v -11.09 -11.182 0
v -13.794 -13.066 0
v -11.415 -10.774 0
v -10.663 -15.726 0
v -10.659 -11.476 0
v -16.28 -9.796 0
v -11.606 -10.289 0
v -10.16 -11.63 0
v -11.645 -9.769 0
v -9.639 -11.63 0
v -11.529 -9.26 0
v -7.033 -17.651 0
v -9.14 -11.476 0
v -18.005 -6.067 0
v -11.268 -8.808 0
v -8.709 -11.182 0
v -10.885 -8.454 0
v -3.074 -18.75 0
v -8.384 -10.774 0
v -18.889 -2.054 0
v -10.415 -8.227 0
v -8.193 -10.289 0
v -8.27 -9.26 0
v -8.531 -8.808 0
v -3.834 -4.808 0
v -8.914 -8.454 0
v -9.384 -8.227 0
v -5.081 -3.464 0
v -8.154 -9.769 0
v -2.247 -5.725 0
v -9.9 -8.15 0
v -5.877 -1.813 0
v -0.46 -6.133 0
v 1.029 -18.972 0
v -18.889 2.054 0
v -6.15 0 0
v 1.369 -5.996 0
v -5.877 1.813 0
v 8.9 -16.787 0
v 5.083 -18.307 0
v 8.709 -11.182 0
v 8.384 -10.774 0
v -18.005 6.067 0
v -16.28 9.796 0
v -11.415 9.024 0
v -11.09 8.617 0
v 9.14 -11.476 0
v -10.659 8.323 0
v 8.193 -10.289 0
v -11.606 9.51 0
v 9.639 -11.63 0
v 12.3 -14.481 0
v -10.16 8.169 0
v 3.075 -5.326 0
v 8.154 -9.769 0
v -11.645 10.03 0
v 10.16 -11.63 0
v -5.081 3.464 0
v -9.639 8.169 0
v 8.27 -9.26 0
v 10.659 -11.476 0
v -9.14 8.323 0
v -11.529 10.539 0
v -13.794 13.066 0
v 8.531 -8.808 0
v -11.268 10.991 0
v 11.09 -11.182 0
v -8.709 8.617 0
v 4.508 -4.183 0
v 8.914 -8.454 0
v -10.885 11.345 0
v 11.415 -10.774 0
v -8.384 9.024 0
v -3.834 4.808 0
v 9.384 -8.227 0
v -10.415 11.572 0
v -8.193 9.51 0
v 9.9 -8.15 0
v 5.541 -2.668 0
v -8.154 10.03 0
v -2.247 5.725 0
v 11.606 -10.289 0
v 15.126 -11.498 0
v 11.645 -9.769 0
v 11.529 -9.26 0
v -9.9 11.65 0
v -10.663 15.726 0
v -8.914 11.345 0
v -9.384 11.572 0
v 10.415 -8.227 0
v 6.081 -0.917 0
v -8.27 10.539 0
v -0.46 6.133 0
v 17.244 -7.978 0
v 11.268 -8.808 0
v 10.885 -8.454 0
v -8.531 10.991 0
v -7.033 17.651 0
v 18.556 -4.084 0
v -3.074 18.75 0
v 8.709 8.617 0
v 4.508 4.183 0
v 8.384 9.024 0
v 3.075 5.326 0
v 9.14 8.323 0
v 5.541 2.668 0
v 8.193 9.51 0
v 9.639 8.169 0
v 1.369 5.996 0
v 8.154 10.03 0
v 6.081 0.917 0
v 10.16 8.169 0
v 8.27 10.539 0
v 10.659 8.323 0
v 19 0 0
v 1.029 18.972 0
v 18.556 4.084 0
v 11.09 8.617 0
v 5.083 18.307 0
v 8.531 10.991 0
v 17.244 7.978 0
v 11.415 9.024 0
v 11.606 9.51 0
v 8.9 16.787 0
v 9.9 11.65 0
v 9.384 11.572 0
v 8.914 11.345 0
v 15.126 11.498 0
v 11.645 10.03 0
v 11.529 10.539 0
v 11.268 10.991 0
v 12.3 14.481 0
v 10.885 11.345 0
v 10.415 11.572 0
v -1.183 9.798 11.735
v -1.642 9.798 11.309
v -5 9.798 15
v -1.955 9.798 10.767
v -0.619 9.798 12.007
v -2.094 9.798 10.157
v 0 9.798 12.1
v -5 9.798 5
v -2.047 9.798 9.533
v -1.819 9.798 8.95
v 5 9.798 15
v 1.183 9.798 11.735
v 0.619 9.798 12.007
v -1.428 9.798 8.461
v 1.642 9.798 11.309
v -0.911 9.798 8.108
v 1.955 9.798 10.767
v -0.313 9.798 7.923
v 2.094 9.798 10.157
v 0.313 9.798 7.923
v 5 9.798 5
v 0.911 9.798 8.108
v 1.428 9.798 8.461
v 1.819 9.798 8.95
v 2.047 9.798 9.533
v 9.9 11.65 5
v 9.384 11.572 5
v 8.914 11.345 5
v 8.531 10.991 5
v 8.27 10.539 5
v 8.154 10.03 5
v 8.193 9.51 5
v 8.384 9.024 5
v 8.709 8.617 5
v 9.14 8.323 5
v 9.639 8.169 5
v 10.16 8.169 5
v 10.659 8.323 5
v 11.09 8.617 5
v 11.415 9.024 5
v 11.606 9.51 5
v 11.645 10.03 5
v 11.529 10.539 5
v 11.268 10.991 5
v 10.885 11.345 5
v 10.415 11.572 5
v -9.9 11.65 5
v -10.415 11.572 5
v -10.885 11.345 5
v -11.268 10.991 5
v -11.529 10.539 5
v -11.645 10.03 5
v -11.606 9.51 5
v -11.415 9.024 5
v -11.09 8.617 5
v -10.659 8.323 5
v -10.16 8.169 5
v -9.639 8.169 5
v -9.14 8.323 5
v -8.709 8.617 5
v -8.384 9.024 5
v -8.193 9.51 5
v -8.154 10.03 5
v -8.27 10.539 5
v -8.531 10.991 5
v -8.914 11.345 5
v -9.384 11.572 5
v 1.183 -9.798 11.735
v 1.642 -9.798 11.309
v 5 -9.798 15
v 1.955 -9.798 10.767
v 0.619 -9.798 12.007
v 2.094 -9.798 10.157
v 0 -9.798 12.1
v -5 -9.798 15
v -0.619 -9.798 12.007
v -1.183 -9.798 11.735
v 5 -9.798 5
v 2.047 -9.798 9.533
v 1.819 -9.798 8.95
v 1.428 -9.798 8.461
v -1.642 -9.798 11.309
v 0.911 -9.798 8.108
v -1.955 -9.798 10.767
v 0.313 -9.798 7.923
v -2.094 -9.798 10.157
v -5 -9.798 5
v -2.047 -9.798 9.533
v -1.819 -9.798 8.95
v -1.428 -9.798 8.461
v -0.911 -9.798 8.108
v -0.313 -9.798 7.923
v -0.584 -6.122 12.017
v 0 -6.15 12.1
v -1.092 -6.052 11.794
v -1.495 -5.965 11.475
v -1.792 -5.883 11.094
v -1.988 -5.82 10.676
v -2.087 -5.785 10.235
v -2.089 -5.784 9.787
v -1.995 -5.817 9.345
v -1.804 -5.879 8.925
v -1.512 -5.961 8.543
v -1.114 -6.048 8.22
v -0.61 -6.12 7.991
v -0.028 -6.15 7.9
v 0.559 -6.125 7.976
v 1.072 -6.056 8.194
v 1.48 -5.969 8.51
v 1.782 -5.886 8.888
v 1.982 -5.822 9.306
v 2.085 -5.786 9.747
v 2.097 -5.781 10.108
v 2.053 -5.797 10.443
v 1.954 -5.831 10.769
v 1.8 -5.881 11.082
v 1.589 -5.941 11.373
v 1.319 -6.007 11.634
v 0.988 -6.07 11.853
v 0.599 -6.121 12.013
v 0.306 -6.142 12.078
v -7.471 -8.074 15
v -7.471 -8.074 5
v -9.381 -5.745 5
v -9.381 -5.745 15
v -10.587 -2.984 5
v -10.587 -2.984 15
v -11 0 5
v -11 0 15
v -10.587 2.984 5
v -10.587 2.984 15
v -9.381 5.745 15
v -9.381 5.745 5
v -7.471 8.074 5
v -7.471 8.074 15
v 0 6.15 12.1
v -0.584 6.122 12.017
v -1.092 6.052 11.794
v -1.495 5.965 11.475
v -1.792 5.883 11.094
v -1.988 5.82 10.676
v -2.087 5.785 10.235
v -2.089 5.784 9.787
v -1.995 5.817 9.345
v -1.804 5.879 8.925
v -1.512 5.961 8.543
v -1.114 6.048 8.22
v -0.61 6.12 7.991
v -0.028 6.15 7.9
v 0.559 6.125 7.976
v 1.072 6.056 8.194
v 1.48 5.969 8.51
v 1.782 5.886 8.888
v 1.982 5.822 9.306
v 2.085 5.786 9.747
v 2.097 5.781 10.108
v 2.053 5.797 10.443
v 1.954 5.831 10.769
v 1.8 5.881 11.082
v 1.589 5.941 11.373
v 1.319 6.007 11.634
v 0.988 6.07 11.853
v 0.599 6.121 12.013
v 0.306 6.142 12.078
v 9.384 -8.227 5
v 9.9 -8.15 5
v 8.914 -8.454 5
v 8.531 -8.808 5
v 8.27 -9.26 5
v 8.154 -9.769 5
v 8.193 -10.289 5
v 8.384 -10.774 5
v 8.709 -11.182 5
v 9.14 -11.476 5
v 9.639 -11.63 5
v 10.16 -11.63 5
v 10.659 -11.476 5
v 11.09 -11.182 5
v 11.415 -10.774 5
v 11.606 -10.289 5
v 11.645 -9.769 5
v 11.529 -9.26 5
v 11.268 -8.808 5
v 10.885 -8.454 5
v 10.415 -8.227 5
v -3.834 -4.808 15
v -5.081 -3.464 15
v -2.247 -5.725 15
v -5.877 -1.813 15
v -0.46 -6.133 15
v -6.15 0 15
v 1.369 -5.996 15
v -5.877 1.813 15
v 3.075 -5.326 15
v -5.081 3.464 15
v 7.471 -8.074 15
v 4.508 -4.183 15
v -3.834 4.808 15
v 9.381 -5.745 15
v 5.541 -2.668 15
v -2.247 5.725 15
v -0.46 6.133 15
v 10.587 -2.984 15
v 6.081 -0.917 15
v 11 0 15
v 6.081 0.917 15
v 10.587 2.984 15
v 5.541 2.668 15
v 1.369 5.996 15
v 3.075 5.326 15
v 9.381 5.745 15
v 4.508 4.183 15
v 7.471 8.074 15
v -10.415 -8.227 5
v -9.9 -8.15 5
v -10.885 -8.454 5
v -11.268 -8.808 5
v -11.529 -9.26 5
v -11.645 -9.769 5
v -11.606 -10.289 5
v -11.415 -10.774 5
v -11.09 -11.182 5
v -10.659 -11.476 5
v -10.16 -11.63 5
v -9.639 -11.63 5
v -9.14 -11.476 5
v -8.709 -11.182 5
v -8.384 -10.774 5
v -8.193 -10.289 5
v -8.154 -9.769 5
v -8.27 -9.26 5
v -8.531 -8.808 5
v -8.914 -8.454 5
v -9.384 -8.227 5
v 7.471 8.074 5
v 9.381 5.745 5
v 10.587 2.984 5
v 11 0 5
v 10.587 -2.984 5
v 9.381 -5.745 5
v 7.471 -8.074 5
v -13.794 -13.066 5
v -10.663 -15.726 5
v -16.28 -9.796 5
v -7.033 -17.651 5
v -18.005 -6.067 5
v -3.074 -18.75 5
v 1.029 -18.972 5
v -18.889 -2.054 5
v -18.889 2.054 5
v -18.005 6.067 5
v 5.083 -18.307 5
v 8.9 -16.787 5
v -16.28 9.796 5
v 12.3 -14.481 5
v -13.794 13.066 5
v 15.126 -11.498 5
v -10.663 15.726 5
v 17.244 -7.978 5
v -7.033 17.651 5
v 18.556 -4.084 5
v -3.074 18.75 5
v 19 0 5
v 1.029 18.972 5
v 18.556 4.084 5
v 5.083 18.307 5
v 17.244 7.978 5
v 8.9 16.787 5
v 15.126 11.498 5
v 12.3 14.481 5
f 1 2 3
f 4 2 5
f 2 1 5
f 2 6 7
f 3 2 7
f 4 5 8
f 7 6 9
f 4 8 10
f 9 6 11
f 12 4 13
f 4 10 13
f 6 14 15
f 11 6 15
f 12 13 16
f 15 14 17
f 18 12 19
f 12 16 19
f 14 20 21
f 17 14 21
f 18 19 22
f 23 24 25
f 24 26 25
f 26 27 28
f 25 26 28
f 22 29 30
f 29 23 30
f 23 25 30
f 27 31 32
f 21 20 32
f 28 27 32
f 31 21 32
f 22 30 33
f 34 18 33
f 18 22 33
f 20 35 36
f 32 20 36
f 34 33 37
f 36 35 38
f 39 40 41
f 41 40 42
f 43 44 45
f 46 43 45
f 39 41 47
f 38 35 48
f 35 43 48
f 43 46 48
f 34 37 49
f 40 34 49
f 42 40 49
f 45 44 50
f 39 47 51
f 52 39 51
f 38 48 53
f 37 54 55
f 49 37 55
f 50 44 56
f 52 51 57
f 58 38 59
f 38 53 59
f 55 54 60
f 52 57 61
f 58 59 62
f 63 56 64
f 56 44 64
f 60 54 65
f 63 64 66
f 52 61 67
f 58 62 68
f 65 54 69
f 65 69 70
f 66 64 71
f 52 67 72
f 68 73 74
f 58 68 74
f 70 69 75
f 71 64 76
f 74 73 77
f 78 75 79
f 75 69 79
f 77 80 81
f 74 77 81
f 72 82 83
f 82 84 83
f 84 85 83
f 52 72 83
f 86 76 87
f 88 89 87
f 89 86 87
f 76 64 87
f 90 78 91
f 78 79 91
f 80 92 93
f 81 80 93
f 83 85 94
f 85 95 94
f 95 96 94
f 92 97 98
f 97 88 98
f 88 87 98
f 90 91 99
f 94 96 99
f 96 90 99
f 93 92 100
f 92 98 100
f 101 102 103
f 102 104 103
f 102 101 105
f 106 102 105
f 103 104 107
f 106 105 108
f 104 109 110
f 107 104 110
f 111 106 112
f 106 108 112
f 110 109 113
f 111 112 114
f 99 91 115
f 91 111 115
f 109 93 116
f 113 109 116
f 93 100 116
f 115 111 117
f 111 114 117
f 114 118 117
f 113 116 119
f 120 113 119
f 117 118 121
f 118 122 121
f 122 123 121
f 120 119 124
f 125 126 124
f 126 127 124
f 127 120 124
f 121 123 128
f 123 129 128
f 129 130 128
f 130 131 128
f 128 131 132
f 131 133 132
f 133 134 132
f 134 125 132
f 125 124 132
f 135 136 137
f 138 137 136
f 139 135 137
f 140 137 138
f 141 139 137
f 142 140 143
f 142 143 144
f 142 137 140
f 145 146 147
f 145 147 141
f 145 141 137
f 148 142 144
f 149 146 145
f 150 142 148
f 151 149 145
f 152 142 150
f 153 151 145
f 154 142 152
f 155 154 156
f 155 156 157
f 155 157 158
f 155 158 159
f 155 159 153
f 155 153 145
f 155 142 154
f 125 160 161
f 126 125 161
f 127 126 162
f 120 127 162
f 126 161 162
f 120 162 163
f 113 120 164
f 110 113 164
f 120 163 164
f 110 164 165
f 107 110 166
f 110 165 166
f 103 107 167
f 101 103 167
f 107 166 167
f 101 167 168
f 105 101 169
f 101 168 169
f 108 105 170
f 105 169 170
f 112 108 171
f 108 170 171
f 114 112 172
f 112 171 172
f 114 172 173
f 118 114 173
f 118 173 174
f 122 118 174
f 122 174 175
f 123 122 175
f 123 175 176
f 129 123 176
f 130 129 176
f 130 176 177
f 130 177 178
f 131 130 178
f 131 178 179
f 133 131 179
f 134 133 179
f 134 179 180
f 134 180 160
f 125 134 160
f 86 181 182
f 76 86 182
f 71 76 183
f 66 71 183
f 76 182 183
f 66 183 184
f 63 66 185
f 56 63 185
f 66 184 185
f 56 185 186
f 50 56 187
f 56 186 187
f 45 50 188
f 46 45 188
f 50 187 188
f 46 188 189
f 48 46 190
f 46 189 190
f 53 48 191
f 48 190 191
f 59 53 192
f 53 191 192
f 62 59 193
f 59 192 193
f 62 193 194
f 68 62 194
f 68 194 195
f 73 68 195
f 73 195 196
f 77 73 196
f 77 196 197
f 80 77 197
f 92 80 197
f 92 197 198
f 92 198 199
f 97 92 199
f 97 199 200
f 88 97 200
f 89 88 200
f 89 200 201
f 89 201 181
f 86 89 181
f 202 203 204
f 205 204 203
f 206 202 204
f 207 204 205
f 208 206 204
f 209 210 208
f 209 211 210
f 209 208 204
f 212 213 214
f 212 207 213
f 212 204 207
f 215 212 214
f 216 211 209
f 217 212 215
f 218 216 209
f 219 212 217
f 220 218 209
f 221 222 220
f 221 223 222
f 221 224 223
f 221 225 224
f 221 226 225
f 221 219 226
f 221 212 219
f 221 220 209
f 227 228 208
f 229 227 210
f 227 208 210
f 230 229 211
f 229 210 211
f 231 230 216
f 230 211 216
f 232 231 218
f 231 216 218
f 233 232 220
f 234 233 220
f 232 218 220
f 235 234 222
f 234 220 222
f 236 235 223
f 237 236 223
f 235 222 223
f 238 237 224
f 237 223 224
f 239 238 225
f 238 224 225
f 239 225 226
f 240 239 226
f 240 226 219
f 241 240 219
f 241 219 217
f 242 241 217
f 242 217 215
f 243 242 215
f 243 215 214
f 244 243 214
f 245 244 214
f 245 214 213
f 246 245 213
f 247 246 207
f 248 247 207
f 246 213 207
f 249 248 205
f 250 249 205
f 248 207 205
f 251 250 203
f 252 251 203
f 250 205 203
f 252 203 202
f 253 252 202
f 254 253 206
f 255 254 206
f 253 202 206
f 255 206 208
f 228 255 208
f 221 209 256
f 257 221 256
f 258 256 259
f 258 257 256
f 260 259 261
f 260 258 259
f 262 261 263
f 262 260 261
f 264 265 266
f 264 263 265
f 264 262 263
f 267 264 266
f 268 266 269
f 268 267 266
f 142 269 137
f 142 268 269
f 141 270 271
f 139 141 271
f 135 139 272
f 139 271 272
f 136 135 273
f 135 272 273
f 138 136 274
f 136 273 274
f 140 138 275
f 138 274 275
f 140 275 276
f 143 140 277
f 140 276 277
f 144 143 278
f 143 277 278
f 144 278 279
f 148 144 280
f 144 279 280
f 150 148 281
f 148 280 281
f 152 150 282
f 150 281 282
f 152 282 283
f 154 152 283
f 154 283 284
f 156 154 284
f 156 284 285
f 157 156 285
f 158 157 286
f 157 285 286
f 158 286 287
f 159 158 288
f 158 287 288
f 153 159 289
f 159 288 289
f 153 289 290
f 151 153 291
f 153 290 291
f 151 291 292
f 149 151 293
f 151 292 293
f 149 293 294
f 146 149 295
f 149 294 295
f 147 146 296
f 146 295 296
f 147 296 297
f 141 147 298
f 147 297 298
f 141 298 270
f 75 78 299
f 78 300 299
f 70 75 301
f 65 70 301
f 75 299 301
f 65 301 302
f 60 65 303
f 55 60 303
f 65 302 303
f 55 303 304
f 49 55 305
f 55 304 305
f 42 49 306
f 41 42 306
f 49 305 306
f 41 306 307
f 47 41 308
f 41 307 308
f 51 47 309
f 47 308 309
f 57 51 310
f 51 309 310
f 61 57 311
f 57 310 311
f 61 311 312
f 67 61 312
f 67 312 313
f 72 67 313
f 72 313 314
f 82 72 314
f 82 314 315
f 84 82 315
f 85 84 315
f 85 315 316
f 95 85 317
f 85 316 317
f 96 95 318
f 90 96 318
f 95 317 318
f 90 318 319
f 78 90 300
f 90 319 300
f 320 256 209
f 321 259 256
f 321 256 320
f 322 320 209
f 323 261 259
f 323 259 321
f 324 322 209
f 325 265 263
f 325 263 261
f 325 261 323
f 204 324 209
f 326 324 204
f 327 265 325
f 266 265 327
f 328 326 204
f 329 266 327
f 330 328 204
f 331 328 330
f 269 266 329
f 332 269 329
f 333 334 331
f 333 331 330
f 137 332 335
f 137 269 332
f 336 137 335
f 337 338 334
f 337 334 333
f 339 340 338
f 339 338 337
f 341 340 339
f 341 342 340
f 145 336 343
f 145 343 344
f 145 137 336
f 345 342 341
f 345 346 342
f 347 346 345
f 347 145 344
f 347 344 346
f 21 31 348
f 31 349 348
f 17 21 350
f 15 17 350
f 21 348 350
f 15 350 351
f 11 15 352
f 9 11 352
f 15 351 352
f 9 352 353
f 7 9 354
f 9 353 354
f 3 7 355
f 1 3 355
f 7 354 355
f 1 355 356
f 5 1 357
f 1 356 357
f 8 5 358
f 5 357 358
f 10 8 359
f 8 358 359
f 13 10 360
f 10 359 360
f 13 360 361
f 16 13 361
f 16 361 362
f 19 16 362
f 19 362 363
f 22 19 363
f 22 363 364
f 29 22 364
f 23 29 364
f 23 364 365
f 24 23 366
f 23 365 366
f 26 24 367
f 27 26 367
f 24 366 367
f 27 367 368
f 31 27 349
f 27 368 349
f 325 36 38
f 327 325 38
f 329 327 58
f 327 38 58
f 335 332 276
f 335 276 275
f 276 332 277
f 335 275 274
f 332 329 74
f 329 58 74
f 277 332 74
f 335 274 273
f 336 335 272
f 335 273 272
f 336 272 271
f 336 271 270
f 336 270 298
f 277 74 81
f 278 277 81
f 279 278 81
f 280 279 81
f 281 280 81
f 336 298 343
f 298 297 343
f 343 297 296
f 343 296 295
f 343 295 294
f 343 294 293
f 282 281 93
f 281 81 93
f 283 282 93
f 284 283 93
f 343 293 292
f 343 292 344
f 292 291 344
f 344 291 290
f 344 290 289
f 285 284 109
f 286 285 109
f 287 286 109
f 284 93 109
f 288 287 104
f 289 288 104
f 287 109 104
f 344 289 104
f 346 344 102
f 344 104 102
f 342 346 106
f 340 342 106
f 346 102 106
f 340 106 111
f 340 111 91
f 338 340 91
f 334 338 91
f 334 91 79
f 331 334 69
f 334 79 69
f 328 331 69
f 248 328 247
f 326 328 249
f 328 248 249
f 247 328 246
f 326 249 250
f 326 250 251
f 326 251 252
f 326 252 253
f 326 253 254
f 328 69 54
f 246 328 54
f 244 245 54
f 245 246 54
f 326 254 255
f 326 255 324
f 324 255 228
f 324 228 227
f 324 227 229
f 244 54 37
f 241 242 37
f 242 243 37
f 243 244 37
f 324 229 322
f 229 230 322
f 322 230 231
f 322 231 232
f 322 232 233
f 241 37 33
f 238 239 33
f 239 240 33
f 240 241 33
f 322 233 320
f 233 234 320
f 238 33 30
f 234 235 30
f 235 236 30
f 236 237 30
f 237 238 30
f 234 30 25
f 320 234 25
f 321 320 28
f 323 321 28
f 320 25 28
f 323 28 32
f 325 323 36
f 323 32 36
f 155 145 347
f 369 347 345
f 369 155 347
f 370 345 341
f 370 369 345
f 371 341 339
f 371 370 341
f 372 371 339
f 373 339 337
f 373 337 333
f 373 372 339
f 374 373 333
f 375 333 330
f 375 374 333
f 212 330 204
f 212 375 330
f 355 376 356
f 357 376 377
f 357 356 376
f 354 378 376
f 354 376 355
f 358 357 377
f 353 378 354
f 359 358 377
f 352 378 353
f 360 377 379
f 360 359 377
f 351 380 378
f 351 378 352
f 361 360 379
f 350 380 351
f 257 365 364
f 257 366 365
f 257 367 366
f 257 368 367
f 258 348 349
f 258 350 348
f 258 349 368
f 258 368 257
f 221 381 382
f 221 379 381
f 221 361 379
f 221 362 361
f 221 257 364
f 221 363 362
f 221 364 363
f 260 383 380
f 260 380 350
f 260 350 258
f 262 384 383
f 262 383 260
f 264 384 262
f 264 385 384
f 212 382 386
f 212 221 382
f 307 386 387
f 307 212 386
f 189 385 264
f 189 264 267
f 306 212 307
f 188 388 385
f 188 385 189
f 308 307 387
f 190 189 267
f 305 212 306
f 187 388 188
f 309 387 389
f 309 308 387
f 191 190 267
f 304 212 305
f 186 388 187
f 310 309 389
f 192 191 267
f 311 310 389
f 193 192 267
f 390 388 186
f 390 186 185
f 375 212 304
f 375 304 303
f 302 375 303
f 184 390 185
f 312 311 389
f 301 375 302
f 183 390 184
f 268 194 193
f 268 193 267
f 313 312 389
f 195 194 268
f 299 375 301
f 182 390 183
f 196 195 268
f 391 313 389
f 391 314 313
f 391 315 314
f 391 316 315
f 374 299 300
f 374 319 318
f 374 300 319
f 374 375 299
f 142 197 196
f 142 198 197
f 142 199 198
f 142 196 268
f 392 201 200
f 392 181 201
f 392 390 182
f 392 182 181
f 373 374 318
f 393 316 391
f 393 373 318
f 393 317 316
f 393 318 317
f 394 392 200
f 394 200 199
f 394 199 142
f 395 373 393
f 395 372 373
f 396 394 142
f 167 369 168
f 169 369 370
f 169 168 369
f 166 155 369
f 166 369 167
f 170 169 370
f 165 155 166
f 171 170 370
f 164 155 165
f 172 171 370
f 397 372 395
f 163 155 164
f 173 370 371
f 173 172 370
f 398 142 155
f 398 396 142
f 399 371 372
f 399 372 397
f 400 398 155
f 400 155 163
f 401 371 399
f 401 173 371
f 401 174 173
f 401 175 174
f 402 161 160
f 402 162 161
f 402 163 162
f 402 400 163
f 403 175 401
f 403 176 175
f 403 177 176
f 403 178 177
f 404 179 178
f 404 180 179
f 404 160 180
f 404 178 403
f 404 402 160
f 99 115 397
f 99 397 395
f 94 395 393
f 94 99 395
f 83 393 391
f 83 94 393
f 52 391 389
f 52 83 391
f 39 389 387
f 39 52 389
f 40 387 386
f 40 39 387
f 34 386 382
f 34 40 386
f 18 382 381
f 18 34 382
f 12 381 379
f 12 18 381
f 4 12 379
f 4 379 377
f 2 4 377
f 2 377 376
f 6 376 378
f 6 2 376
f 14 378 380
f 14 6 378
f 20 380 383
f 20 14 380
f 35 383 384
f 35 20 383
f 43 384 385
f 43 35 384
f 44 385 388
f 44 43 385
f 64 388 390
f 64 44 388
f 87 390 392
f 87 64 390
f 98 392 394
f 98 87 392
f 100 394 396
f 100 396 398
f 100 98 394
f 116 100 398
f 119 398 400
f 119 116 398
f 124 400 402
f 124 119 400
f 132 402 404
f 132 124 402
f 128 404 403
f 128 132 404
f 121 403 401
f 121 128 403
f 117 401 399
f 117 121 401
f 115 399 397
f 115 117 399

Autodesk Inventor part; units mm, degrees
ref_plane "YZ Plane" through (0, 0, 0) normal (1, 0, 0) x (0, 1, 0)
ref_plane "XZ Plane" through (0, 0, 0) normal (0, 1, 0) x (-1, 0, 0)
ref_plane "XY Plane" through (0, 0, 0) normal (0, 0, 1) x (1, 0, 0)
sketch "スケッチ1" plane through (0, 0, 0) normal (0, 0, 1) x (1, 0, 0)
  circle A0 centre (0, 0) radius 19
  circle A1 centre (0, 0) radius 14
  circle A2 centre (-14, 0) radius 1.75
  circle A3 centre (0, -14) radius 1.75
  circle A4 centre (14, 0) radius 1.75
  circle A5 centre (0, 14) radius 1.75
  line L0 (-19, 0) -> (19, 0)
  dimension "d10" = 28
  dimension "d0" = 38
  dimension "d11" = 3.5
  dimension "d14" = 360
extrude "押し出し1" add sketch "スケッチ1" along normal blind 5
sketch "スケッチ2" plane through (0, 0, 5) normal (0, 0, 1) x (1, 0, 0)
  circle A0 centre (0, 0) radius 11
  line L0 (5, -9.798) -> (-5, -9.798)
  line L1 (-5, -9.798) -> (-5, 9.798)
  line L2 (-5, 9.798) -> (5, 9.798)
  line L3 (5, 9.798) -> (5, -9.798)
  line L4 (5, -9.798) -> (-5, 9.798) construction
  line L5 (-5, -9.798) -> (5, 9.798) construction
  dimension "d3" = 22
  dimension "d6" = 10
extrude "押し出し2" add sketch "スケッチ2" along normal blind 10 contours A0 L3 | L3 L0 L1 L2 | L1 A0
sketch "スケッチ3" plane through (0, 0, 0) normal (0, 0, -1) x (-1, 0, 0)
  circle A0 centre (0, 0) radius 6.15
  dimension "d7" = 12.3
extrude "押し出し3" cut sketch "スケッチ3" against normal blind 30
sketch "スケッチ4" plane through (0, 0, 0) normal (0, 0, -1) x (-1, 0, 0)
  circle A0 centre (0, 0) radius 14
  point P0 (-14, 0)
  point P1 (-9.8995, -9.8995)
  point P2 (0, -14)
  point P3 (9.8995, -9.8995)
  point P4 (14, 0)
  point P5 (9.8995, 9.8995)
  point P6 (0, 14)
  point P7 (-9.8995, 9.8995)
  dimension "d16" = 28
  dimension "d33" = 360
hole "穴1" at (9.8995, -9.8995, 0) at (9.8995, 9.8995, 0) at (-9.8995, 9.8995, 0) at (-9.8995, -9.8995, 0) direction (0, 0, 1) diameter 3.5 end through all
sketch "スケッチ5" plane through (-5, 9.798, 5) normal (0, 1, 0) x (1, 0, 0)
  line L0 (10, -10) -> (0, -10) projected
  line L1 (5, -10) -> (5, 0)
  line L2 (0, 0) -> (10, 0) projected
  point P0 (5, 5)
  point P1 (5, -5)
hole "穴2" at (0, 9.798, 10) direction (0, -1, 0) diameter 4.2 end through all
properties part number "small_tire_fixer"
